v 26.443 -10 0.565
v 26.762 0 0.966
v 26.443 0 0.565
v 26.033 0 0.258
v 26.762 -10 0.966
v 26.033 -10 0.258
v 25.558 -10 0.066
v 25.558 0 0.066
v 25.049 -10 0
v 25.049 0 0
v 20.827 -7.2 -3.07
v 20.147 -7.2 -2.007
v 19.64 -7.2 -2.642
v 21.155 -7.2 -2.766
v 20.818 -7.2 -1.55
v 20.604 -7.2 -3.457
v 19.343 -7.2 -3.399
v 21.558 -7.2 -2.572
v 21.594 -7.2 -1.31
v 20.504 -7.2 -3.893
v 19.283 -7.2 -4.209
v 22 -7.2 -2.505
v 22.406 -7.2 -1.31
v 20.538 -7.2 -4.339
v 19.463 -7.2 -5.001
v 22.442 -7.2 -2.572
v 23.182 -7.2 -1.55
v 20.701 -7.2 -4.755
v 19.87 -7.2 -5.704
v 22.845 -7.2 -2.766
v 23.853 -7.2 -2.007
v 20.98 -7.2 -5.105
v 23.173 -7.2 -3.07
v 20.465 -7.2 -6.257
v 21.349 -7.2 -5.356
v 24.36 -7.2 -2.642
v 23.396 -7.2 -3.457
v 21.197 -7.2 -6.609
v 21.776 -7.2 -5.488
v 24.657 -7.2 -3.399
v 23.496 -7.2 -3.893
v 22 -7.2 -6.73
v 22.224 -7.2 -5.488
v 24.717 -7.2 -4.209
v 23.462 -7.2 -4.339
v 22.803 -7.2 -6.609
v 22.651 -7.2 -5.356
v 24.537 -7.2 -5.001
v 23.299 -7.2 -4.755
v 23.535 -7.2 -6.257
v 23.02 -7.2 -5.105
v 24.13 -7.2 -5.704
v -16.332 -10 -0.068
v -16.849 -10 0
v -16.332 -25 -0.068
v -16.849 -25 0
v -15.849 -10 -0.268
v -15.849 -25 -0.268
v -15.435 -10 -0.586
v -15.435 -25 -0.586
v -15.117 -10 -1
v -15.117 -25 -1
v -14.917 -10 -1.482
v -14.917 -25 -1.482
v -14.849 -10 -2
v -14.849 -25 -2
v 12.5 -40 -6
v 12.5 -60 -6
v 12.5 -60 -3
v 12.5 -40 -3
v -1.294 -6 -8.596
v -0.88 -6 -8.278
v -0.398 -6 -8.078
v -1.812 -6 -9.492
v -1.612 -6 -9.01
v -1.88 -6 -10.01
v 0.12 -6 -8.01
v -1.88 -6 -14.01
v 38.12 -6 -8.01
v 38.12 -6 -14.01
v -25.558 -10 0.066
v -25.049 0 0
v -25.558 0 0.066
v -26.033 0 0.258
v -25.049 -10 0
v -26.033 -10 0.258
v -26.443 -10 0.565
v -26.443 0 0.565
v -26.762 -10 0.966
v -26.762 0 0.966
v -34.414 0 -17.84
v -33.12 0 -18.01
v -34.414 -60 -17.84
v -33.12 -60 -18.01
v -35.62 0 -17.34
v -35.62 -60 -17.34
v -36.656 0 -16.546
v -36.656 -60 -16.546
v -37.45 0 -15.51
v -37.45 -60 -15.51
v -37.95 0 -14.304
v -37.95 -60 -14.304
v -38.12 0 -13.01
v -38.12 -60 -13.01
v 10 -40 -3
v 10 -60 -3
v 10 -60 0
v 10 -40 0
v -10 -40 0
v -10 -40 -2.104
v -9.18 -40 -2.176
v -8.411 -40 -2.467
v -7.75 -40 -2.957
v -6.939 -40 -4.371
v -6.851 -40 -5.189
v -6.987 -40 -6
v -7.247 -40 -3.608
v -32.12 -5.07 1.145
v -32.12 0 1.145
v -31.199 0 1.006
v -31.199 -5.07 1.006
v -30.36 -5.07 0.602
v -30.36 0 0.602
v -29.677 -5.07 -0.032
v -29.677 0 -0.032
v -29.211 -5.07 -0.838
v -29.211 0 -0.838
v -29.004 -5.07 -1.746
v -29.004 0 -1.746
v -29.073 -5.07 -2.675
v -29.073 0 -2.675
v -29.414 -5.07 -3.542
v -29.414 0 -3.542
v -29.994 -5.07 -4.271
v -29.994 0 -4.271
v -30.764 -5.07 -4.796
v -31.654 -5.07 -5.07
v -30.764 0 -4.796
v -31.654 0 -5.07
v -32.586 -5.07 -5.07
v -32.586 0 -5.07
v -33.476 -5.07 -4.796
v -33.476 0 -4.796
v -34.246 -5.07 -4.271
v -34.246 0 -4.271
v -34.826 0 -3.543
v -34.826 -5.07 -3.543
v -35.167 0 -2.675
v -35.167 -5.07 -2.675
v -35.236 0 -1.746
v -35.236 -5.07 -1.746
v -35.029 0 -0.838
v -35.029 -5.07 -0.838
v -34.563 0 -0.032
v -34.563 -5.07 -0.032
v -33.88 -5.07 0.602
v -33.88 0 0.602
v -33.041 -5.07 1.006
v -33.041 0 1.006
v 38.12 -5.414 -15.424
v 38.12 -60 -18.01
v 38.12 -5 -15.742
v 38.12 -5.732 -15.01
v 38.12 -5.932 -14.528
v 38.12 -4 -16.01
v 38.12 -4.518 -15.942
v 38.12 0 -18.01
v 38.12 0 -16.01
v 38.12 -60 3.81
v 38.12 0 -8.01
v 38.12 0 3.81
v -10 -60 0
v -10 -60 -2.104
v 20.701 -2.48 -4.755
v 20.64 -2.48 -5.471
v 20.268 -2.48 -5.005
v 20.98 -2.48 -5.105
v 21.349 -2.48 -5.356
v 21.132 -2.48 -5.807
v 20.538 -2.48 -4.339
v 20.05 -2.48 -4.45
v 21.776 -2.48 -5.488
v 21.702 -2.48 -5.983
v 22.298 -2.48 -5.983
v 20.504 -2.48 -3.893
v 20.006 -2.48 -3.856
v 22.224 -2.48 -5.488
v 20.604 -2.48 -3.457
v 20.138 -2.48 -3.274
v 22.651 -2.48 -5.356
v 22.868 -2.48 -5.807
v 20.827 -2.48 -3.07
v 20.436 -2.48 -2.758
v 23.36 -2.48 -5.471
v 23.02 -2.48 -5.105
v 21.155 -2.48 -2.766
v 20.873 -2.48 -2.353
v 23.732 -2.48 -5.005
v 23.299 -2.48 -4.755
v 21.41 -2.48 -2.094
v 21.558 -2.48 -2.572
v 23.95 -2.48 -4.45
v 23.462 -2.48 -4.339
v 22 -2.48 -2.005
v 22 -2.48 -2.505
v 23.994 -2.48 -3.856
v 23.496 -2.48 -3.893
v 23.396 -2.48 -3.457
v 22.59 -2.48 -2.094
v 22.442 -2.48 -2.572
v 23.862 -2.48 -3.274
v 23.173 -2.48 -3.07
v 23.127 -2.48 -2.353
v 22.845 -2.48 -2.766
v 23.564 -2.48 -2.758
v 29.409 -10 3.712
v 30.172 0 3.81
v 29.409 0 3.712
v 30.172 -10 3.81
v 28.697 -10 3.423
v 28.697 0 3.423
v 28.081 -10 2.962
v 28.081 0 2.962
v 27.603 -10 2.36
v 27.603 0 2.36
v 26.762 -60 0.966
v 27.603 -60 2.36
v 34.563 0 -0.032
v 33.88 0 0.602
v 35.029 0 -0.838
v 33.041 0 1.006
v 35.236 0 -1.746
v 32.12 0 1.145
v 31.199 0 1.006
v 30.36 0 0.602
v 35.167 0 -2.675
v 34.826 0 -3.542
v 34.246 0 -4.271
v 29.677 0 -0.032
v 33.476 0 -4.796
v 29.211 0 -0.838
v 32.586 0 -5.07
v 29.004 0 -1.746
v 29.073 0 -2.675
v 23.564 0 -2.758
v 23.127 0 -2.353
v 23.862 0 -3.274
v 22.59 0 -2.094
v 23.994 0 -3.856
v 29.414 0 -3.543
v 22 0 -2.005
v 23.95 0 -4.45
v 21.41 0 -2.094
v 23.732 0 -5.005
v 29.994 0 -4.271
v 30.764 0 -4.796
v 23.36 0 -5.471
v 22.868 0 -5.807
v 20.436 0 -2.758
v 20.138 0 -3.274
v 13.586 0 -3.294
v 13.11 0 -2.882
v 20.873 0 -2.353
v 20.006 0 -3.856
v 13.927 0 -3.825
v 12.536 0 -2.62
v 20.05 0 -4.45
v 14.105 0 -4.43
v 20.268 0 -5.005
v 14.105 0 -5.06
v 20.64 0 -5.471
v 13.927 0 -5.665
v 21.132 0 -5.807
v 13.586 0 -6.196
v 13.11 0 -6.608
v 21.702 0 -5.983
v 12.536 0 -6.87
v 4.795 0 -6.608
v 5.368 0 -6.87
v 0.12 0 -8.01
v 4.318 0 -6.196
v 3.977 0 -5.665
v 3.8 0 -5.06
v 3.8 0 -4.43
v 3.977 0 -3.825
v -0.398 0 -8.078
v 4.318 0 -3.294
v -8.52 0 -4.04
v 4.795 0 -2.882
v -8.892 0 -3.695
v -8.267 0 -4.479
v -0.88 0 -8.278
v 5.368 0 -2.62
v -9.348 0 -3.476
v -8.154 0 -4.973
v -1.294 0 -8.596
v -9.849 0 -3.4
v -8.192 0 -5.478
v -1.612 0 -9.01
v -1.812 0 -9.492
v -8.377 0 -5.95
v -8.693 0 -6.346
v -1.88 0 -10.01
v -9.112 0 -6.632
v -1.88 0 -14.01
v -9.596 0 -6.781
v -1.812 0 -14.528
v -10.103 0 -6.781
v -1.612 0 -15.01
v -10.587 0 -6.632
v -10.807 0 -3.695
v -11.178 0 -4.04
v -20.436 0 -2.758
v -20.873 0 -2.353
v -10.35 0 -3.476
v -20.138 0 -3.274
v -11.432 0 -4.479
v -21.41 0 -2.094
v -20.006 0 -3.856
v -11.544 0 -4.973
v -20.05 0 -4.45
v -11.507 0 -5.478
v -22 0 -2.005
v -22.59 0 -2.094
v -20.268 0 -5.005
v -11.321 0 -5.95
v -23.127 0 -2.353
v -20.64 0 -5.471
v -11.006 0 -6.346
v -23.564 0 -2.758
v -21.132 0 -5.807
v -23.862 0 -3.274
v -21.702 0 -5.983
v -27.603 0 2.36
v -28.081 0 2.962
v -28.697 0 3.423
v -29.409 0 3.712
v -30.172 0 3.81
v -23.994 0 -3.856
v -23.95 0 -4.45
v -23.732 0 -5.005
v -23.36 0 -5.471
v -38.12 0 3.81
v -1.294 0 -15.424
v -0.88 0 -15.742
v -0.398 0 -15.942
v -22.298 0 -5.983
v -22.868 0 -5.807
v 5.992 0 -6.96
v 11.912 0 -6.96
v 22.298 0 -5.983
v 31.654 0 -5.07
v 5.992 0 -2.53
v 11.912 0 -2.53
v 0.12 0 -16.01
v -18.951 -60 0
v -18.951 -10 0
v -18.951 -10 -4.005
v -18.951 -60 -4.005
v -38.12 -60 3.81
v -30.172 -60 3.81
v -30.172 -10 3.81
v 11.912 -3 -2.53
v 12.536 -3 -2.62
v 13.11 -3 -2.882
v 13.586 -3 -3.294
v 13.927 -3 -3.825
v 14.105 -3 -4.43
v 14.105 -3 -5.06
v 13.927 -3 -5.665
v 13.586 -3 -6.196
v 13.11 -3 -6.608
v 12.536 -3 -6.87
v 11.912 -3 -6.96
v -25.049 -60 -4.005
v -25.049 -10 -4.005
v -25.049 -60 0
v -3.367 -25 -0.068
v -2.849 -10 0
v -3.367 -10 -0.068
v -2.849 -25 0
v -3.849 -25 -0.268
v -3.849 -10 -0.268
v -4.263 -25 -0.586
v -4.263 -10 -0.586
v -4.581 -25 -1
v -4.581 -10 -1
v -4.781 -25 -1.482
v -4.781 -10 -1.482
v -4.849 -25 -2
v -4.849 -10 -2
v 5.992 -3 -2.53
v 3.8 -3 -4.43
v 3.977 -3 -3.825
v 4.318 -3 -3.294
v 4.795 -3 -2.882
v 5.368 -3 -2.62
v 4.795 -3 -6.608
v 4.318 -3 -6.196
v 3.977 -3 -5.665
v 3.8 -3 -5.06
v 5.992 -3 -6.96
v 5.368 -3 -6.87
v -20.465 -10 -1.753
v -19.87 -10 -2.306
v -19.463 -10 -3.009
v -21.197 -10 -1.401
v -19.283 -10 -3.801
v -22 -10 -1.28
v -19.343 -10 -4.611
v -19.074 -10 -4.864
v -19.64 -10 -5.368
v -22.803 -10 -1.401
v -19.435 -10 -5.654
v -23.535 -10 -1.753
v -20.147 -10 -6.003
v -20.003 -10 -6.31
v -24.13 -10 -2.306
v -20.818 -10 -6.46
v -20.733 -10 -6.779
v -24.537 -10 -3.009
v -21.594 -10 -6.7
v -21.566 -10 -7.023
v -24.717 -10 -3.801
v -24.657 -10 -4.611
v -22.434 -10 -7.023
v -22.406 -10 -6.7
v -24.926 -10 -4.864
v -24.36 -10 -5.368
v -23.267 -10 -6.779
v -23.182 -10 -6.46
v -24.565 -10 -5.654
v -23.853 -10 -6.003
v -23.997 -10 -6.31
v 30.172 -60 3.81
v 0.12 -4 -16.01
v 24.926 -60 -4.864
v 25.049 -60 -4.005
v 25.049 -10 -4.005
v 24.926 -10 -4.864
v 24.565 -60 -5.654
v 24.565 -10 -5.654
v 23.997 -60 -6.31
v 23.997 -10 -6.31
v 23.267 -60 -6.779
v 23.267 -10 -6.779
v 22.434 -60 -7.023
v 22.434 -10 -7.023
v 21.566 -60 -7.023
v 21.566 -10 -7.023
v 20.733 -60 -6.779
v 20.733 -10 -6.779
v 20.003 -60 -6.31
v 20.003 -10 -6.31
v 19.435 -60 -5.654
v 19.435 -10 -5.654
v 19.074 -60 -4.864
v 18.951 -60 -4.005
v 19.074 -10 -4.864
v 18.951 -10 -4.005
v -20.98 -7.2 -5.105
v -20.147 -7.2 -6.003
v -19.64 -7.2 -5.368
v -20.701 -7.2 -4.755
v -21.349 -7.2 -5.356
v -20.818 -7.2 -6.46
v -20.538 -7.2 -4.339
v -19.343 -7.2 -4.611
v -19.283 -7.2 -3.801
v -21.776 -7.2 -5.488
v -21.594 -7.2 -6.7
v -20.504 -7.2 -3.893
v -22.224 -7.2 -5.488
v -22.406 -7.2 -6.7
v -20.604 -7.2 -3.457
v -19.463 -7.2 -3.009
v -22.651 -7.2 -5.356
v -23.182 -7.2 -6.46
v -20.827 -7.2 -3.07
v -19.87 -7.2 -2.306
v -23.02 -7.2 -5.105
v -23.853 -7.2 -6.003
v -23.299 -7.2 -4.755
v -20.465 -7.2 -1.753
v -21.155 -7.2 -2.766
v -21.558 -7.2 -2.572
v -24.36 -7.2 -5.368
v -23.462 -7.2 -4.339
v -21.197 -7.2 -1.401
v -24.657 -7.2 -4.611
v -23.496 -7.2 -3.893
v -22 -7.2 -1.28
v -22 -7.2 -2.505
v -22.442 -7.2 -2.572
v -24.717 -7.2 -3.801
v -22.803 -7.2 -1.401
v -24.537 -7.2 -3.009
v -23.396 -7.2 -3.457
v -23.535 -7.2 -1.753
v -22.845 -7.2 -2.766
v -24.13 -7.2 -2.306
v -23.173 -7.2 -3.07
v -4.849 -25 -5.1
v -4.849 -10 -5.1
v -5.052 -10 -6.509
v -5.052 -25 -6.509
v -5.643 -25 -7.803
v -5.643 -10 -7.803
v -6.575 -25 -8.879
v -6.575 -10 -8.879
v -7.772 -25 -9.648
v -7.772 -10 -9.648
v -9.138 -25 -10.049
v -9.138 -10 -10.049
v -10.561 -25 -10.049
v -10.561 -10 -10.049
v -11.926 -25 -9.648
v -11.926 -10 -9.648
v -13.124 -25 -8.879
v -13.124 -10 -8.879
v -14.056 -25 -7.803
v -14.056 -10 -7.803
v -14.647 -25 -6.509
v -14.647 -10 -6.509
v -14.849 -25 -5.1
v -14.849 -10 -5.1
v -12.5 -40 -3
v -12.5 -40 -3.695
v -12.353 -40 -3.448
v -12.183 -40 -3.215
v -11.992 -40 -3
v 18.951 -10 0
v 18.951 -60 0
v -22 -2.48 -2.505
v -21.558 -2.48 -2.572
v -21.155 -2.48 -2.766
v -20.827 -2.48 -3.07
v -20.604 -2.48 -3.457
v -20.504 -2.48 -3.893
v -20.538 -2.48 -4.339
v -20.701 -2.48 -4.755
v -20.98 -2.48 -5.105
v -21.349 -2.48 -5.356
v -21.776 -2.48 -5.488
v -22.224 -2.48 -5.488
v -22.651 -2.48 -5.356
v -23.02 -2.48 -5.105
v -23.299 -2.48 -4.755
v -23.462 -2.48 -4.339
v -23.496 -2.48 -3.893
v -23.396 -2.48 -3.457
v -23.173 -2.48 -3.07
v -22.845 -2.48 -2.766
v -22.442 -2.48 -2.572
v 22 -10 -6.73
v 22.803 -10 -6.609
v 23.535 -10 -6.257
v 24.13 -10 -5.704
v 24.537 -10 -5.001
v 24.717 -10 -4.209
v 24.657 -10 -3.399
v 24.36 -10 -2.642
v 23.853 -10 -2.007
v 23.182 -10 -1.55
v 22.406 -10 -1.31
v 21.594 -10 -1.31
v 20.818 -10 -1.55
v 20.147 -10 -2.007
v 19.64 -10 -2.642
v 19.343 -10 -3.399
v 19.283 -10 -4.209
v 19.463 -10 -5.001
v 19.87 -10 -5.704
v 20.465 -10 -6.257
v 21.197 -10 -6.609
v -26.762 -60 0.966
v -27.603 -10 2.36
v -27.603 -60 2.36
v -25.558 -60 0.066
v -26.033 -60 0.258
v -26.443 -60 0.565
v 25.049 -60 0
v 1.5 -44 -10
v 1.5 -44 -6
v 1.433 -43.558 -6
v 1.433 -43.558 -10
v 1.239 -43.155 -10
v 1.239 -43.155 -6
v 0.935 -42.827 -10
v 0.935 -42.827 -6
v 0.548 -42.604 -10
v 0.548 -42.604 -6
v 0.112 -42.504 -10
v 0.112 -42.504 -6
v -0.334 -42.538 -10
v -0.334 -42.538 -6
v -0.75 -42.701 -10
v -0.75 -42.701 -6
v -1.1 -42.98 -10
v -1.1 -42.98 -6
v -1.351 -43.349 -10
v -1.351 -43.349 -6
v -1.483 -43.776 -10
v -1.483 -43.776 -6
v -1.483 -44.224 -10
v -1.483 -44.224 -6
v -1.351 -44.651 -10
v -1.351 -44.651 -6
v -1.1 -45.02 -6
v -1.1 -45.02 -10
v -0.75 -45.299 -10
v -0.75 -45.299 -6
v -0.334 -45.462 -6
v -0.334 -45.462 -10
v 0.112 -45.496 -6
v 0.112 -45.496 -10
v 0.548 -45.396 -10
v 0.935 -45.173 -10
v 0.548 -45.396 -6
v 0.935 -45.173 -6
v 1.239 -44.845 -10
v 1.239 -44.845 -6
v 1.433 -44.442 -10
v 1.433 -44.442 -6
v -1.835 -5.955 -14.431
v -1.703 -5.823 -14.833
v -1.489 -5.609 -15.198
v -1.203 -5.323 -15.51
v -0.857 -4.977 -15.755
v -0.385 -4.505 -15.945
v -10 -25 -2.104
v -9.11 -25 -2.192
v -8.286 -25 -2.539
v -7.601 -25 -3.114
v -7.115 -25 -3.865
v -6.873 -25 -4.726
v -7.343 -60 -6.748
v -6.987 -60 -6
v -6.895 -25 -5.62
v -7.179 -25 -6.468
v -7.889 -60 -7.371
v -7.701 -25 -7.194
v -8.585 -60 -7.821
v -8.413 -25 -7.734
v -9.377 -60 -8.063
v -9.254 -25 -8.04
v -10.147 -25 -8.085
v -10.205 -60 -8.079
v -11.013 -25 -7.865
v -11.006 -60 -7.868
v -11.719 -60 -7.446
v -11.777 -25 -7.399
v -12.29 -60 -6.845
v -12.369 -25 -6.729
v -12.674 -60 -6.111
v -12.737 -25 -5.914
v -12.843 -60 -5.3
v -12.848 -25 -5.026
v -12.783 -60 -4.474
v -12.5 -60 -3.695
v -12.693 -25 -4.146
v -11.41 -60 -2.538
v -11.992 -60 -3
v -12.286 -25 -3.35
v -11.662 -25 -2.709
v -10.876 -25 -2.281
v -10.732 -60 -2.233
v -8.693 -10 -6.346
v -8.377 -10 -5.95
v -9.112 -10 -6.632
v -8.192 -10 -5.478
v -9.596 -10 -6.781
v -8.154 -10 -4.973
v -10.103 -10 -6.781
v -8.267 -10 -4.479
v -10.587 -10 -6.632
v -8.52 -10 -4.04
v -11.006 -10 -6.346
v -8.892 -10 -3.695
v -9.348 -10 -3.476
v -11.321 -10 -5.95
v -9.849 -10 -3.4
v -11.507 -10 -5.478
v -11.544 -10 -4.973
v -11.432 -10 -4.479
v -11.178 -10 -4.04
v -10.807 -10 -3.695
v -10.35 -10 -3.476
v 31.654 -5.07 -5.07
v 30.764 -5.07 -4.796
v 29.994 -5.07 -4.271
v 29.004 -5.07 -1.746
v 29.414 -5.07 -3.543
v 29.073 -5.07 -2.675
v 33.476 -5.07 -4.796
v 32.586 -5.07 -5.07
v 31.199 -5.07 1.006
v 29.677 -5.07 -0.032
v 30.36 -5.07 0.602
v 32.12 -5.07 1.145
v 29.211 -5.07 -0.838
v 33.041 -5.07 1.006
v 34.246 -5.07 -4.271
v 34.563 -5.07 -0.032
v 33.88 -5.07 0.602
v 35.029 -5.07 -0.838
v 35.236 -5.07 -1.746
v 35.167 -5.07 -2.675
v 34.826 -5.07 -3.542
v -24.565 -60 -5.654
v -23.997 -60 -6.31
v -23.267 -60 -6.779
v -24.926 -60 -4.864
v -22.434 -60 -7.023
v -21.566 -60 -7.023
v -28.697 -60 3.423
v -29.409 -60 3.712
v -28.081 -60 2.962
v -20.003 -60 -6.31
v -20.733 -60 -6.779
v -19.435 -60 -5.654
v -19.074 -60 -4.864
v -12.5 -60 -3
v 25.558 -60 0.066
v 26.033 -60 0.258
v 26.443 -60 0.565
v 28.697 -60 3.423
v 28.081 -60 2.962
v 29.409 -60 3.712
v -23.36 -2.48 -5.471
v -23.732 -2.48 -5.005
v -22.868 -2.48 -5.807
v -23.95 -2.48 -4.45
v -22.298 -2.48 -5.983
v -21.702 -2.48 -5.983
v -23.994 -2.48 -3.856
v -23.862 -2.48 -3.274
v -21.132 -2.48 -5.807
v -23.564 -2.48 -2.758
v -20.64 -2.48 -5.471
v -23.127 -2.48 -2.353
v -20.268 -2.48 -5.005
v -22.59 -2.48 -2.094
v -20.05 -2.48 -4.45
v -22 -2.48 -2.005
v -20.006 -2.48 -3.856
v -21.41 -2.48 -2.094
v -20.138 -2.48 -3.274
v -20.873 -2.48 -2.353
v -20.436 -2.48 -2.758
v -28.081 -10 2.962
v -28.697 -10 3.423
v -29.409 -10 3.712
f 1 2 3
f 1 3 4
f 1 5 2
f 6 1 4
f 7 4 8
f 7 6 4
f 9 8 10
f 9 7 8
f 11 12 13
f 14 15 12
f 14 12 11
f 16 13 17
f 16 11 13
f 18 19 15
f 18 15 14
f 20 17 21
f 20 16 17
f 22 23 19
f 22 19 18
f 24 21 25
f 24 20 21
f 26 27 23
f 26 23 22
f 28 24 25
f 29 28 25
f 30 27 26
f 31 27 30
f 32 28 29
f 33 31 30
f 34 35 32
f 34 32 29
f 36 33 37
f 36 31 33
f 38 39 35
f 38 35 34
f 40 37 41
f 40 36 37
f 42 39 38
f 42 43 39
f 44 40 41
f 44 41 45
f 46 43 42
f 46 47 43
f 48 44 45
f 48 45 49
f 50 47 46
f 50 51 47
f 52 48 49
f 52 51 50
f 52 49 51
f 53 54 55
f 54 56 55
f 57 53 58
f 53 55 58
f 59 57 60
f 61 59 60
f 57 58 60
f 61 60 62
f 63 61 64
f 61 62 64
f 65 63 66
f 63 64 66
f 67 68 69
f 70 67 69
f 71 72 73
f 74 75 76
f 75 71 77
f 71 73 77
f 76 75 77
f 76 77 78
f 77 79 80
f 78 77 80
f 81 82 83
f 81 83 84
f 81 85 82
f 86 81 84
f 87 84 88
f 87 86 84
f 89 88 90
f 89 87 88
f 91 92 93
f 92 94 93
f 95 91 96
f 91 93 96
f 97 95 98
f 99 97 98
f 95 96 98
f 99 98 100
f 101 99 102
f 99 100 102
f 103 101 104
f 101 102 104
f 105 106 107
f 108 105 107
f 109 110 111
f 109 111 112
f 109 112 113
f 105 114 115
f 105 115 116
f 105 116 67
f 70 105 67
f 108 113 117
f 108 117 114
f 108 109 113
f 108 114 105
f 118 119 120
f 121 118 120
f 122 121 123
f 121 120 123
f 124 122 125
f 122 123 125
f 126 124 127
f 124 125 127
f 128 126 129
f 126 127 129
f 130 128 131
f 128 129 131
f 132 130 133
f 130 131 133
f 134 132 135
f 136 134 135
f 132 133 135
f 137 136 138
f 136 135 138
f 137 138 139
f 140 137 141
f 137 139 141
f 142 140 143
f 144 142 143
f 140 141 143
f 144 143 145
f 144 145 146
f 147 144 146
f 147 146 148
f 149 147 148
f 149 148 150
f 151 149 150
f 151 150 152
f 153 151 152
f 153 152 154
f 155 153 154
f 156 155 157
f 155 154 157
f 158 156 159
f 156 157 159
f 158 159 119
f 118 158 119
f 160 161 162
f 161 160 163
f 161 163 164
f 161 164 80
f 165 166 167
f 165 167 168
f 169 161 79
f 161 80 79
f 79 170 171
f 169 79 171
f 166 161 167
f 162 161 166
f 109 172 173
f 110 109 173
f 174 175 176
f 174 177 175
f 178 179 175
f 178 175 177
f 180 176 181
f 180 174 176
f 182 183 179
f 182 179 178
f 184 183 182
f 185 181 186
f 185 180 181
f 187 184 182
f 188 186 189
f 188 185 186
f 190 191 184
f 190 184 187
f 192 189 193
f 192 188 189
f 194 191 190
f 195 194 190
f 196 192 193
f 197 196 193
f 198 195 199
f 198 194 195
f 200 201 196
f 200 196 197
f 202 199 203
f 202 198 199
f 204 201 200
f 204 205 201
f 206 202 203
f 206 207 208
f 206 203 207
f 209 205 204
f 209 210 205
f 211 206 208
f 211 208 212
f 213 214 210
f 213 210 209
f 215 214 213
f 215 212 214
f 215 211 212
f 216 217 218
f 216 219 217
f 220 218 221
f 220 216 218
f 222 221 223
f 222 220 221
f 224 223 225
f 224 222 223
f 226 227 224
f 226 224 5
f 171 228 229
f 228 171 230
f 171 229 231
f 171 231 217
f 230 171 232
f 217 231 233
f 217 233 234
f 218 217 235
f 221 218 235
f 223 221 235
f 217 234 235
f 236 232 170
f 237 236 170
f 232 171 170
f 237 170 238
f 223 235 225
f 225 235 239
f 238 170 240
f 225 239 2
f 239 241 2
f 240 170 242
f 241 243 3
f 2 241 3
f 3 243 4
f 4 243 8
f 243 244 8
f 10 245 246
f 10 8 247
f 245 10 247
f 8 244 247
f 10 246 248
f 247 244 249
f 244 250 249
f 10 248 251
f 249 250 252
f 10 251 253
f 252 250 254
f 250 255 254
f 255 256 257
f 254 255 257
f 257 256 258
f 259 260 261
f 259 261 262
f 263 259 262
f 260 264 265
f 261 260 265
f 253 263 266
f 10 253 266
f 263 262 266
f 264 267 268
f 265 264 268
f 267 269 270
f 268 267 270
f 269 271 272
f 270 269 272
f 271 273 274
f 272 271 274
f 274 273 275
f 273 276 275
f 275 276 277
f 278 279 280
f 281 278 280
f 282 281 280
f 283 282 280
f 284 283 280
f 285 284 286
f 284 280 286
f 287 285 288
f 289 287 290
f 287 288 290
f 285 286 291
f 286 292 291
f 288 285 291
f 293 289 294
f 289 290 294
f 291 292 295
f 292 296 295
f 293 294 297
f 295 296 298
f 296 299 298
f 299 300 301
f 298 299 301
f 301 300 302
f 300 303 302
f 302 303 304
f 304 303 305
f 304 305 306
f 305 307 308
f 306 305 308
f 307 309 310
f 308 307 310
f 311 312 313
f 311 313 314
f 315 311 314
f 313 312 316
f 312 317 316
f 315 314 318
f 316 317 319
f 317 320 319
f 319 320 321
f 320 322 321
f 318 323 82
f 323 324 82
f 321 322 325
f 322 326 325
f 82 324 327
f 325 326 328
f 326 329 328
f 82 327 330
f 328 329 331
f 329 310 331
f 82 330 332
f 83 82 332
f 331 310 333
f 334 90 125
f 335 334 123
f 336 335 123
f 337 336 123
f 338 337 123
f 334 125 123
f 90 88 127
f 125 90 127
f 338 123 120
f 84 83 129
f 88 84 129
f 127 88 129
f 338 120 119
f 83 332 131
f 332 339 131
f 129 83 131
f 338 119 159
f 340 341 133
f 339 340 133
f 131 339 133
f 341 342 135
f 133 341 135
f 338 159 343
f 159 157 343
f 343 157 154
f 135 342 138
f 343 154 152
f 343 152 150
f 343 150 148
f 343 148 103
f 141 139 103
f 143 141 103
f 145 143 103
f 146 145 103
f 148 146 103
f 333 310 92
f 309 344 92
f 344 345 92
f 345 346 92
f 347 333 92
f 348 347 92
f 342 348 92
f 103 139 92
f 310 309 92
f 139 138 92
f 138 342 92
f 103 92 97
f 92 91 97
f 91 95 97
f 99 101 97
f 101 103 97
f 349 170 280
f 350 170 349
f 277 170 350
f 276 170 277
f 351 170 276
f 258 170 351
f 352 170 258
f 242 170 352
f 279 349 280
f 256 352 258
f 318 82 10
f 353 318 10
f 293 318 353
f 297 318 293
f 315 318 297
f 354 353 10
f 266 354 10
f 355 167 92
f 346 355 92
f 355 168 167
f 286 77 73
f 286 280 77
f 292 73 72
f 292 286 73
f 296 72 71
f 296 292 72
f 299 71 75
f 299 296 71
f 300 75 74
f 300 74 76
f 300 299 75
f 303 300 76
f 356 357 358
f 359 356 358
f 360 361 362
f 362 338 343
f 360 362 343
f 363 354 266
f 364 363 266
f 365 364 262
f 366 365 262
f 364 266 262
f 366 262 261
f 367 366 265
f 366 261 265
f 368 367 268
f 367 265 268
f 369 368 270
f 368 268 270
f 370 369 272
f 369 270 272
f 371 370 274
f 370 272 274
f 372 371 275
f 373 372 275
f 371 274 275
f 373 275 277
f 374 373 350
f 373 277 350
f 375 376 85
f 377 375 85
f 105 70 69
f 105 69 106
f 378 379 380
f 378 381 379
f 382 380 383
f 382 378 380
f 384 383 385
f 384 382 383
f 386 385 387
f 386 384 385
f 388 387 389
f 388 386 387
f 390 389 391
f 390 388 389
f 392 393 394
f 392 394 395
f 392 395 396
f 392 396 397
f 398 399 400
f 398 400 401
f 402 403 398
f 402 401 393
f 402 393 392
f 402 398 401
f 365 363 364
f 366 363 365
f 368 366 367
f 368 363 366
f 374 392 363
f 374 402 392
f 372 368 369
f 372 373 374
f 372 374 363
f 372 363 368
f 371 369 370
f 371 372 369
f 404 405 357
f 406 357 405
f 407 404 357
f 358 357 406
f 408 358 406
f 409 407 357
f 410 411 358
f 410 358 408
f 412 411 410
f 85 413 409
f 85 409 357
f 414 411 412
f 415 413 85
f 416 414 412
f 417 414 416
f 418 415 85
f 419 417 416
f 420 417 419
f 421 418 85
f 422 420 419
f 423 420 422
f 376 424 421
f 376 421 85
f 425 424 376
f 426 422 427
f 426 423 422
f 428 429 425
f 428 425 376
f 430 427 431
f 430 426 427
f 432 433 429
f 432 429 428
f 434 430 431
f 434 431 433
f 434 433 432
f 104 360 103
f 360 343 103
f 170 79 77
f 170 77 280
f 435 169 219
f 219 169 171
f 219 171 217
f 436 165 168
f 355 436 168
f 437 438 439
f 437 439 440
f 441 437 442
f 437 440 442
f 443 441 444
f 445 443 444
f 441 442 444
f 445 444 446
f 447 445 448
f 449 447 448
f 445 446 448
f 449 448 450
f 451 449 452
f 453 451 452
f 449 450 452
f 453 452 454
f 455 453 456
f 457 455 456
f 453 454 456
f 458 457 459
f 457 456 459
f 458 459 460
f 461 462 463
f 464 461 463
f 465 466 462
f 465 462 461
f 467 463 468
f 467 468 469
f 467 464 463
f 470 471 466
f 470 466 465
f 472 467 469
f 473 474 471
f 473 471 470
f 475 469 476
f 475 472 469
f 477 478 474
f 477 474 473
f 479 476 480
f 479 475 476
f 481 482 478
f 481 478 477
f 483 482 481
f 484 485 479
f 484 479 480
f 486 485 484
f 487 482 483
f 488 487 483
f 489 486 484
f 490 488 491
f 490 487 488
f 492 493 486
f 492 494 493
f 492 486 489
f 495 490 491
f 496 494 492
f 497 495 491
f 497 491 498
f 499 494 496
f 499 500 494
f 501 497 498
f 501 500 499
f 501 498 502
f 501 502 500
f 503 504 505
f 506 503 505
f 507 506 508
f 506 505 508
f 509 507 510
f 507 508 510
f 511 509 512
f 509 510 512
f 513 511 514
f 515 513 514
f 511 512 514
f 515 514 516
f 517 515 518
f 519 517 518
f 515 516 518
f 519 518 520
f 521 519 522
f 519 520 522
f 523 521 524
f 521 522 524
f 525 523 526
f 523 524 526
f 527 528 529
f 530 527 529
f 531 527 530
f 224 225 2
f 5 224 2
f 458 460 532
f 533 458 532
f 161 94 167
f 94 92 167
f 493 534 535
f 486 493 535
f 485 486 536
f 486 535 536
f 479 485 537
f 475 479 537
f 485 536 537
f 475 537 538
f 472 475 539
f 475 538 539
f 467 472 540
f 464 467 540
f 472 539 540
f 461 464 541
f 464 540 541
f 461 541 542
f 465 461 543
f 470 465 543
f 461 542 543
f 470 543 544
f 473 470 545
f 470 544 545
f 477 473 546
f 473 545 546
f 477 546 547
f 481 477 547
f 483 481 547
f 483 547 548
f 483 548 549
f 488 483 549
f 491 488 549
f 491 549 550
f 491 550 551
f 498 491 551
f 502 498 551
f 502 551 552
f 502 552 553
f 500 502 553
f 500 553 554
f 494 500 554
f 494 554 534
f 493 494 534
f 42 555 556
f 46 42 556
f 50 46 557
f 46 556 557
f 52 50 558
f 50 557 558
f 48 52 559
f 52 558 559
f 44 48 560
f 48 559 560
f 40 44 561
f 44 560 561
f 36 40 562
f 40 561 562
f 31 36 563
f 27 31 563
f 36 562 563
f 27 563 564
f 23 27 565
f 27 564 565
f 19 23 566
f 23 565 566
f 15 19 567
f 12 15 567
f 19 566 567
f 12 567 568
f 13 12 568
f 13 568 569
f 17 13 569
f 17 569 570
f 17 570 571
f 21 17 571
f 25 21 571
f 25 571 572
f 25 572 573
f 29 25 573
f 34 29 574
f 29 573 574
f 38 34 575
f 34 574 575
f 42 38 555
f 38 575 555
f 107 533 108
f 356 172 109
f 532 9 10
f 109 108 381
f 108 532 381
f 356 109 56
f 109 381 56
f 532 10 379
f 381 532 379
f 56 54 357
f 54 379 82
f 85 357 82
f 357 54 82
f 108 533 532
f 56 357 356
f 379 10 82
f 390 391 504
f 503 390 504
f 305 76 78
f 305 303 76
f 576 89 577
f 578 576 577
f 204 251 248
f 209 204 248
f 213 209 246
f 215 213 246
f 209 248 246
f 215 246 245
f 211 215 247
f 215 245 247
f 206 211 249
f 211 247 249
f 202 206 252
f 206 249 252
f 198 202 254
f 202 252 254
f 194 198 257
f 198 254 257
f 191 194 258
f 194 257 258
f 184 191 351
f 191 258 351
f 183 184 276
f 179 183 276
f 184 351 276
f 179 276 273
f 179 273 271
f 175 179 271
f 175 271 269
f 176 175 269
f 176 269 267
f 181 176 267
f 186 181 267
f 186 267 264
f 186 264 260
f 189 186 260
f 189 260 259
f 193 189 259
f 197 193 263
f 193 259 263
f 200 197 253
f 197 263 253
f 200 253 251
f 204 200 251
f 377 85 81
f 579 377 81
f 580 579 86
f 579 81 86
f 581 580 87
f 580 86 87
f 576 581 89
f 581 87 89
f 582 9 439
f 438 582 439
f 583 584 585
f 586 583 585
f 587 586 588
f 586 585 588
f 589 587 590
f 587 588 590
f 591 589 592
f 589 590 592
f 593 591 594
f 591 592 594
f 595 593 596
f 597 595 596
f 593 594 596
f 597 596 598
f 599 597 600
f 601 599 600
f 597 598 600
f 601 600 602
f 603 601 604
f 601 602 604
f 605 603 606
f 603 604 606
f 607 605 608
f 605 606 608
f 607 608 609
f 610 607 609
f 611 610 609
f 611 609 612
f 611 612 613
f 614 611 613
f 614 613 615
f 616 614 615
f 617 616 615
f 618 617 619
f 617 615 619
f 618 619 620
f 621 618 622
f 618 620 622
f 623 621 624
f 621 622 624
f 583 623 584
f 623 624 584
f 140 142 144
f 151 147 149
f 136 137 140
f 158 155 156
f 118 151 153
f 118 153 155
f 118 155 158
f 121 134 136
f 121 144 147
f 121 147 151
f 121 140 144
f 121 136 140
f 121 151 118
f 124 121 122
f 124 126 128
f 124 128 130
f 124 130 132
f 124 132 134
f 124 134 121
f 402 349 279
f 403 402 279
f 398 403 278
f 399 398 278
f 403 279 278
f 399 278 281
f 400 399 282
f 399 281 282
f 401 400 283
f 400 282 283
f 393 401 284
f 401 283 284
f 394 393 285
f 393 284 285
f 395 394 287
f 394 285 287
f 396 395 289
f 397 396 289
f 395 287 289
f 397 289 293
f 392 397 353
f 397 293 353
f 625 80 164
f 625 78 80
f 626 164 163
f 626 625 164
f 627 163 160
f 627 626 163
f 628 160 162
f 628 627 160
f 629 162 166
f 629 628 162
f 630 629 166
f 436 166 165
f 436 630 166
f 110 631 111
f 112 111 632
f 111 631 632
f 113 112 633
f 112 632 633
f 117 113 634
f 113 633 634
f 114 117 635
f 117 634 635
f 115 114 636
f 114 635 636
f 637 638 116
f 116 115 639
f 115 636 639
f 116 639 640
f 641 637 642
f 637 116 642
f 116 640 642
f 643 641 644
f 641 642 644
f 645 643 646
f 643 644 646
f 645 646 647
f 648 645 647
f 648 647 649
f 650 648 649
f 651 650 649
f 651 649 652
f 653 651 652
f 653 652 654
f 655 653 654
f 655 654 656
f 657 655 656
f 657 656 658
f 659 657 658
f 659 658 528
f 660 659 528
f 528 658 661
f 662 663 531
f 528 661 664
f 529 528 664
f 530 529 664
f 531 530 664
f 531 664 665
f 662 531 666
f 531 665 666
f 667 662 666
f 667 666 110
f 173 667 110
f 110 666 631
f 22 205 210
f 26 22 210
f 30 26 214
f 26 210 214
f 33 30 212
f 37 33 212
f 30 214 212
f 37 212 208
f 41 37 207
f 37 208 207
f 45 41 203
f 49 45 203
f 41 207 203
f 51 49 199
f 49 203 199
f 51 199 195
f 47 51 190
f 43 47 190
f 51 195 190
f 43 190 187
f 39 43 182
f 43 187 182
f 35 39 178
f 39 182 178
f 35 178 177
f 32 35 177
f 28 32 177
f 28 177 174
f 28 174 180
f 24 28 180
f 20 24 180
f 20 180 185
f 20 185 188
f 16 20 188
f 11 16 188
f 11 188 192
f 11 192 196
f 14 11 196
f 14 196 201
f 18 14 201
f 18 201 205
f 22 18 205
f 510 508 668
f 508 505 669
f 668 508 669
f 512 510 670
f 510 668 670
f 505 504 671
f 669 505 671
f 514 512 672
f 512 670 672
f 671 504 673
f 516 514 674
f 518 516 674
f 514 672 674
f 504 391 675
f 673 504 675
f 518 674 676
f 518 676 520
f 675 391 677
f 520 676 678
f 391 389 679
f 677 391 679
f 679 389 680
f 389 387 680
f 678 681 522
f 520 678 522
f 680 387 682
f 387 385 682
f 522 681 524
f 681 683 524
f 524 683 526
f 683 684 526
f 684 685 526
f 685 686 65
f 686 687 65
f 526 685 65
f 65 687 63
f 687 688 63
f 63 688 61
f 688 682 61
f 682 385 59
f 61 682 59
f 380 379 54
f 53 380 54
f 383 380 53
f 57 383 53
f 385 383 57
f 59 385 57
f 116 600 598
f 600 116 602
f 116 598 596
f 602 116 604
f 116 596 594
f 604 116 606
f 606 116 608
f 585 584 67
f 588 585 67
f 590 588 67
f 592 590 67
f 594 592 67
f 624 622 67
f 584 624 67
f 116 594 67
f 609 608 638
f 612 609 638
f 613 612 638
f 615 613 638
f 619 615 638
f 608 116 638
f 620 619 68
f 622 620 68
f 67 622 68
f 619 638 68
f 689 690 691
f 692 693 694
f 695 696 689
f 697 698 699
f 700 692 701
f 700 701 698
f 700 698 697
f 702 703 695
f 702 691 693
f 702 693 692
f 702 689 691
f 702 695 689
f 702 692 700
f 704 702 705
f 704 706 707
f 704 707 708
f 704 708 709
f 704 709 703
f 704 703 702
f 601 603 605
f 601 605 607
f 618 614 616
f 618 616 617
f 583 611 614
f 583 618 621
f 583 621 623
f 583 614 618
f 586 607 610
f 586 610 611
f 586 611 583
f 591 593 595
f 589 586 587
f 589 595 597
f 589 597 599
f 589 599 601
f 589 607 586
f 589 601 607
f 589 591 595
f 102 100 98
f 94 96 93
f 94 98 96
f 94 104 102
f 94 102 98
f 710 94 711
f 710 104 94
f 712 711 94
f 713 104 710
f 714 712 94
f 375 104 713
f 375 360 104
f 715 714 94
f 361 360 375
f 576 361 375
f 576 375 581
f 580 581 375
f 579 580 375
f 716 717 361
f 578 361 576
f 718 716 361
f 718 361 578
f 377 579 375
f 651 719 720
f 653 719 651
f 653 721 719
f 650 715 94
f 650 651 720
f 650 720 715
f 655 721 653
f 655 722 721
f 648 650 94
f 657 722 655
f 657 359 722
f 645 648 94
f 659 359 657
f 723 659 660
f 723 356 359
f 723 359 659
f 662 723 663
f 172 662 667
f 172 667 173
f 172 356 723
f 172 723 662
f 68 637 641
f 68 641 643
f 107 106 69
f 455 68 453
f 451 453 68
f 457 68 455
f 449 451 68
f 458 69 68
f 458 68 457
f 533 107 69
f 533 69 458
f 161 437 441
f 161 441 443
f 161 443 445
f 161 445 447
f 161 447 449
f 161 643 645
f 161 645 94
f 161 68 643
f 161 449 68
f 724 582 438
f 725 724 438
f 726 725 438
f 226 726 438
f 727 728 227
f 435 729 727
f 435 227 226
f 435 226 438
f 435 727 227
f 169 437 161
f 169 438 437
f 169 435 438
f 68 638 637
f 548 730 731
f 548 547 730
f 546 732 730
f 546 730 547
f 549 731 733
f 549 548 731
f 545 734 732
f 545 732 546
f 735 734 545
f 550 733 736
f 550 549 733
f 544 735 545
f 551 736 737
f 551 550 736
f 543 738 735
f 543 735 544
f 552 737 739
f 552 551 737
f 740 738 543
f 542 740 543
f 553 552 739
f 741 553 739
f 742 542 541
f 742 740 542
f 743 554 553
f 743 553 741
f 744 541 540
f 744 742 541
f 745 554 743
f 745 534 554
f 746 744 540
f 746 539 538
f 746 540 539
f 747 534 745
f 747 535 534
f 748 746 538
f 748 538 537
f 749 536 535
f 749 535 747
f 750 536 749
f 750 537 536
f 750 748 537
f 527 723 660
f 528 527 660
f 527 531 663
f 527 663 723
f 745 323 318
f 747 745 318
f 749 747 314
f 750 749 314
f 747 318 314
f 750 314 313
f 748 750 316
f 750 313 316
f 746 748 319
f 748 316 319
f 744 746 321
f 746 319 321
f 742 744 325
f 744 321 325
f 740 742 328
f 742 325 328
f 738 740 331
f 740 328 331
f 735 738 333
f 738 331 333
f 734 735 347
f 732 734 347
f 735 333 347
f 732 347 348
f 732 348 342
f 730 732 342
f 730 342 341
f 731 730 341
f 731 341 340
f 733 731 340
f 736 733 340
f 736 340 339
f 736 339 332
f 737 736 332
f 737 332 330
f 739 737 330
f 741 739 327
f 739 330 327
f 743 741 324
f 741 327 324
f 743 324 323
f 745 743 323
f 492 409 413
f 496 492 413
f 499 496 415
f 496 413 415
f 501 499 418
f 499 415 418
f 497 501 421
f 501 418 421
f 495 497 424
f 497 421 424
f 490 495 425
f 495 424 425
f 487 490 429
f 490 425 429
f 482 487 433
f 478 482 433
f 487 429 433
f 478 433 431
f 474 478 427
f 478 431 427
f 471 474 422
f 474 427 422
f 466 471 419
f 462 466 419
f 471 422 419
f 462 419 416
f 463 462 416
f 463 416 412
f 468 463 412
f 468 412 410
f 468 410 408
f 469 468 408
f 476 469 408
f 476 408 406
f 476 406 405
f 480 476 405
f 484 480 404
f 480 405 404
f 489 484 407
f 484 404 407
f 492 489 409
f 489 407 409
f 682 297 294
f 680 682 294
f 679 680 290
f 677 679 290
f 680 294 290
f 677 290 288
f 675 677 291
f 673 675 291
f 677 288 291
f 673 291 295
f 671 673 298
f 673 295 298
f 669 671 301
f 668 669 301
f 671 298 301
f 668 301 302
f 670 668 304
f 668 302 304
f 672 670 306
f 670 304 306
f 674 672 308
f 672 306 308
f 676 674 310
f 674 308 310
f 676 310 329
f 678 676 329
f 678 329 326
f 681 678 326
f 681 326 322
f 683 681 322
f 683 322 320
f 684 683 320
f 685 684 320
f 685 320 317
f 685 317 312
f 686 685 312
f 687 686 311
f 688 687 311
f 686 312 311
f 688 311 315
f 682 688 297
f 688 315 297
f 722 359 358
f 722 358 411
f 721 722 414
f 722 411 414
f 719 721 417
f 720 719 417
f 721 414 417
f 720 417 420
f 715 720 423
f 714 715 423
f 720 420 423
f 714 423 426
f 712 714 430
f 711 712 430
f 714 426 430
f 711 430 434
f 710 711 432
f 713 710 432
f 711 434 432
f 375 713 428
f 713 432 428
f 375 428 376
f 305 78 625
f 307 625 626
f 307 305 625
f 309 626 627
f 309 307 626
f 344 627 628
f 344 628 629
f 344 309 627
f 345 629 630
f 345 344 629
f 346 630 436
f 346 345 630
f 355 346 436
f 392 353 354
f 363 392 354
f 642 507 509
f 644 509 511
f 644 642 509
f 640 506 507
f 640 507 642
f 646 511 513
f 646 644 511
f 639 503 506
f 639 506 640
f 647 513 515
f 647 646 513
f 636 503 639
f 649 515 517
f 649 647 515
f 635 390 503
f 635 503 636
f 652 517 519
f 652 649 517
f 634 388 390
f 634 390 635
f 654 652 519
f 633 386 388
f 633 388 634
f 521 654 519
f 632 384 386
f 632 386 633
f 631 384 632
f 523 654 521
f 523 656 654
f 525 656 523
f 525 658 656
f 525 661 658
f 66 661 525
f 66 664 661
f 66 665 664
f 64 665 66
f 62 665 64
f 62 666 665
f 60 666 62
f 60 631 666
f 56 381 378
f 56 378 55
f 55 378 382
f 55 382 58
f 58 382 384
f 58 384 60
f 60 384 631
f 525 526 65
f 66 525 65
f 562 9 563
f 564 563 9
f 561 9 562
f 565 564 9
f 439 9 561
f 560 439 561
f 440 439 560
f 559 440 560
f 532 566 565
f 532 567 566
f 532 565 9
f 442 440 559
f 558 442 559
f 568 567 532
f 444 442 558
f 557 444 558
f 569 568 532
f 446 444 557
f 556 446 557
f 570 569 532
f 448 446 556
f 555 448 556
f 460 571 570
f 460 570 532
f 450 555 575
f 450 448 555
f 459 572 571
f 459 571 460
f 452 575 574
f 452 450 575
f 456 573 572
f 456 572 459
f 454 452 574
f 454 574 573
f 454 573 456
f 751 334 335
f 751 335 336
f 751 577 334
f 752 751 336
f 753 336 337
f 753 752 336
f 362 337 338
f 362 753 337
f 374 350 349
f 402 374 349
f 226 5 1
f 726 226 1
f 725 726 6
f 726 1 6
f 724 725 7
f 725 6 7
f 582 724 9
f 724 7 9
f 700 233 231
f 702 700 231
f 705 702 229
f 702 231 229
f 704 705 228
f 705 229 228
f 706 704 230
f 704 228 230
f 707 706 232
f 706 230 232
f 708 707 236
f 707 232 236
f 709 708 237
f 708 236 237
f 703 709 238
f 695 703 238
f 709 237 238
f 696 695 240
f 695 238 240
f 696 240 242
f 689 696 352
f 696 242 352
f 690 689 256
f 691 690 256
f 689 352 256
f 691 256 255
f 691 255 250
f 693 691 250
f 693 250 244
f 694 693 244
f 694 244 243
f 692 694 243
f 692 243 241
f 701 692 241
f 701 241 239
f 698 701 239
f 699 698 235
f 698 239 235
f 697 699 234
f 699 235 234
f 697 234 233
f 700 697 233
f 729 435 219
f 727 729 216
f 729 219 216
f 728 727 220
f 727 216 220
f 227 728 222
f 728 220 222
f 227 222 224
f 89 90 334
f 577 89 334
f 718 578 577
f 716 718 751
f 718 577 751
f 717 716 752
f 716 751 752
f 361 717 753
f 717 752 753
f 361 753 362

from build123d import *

# Parameters (mm, degrees)
SKETCH1_R           = 2
SKETCH1_R_2         = 3.125
SKETCH1_R_3         = 1.7
BOSS_EXTRUDE1_DEPTH = 10
FILLET2_R           = 3
FILLET1_R           = 2
SKETCH1_4_R         = 3.125
CUT_EXTRUDE3_DEPTH  = 5.07
SKETCH1_7_R         = 1.7
CUT_EXTRUDE6_DEPTH  = 10
CUT_EXTRUDE5_DEPTH  = 3
SKETCH1_5_R         = 2
CUT_EXTRUDE4_DEPTH  = 2.48
SKETCH4_R           = 1.5
CUT_EXTRUDE7_DEPTH  = 10
SKETCH5_R           = 2.725
CUT_EXTRUDE8_DEPTH  = 2.8
BOSS_EXTRUDE2_DEPTH = 10
BOSS_EXTRUDE3_DEPTH = 50
FILLET13_R          = 5
CUT_EXTRUDE14_DEPTH = 15
SKETCH10_W          = 8
SKETCH10_H          = 6
CUT_EXTRUDE12_DEPTH = 40
FILLET12_R          = 2
FILLET14_R          = 2
CUT_EXTRUDE17_DEPTH = 20
SKETCH19_R          = 1.5
CUT_EXTRUDE18_DEPTH = 4
CUT_EXTRUDE19_START = 35
SKETCH20_R          = 3
CUT_EXTRUDE19_DEPTH = 109.331401869


with BuildPart() as part:
    # Sketch1 → Boss-Extrude1 (new body)
    with BuildSketch(Plane(origin=(0, 0, 0), x_dir=(1, 0, 0), z_dir=(0, 1, 0))):
        with BuildLine():
            ThreePointArc((-11.409245094, 8.977987014), (-9.849239736, 9.28), (-8.289234378, 8.977987014))
            ThreePointArc((-8.289234378, 8.977987014), (-5.835653376, 8.254222737), (-3.289234378, 8.01))
            Line((-3.289234378, 8.01), (38.12, 8.01))
            Line((38.12, 8.01), (38.12, -3.81))
            Line((38.12, -3.81), (28.478275237, -3.81))
            Line((28.478275237, -3.81), (26.178275237, 0))
            Line((26.178275237, 0), (-26.178275237, 0))
            Line((-26.178275237, 0), (-28.478275237, -3.81))
            Line((-28.478275237, -3.81), (-38.12, -3.81))
            Line((-38.12, -3.81), (-38.12, 8.01))
            Line((-38.12, 8.01), (-16.409245094, 8.01))
            ThreePointArc((-16.409245094, 8.01), (-13.862826096, 8.254222737), (-11.409245094, 8.977987014))
        make_face()
        with Locations((22, 4.005)):
            Circle(SKETCH1_R, mode=Mode.SUBTRACT)
        with Locations((-22, 4.005)):
            Circle(SKETCH1_R, mode=Mode.SUBTRACT)
        with Locations((-32.12, 1.98)):
            Circle(SKETCH1_R_2, mode=Mode.SUBTRACT)
        with Locations((32.12, 1.98)):
            Circle(SKETCH1_R_2, mode=Mode.SUBTRACT)
        with Locations((-9.849239736, 5.1)):
            Circle(SKETCH1_R_3, mode=Mode.SUBTRACT)
        with BuildLine():
            ThreePointArc((11.912105026, 2.53), (14.127105026, 4.745), (11.912105026, 6.96))
            Line((11.912105026, 6.96), (5.992105026, 6.96))
            ThreePointArc((5.992105026, 6.96), (3.777105026, 4.745), (5.992105026, 2.53))
            Line((5.992105026, 2.53), (11.912105026, 2.53))
        make_face(mode=Mode.SUBTRACT)
        with Locations((-22, 4.005)):
            Circle(SKETCH1_R)
        with Locations((-9.849239736, 5.1)):
            Circle(SKETCH1_R_3)
        with Locations((-32.12, 1.98)):
            Circle(SKETCH1_R_2)
        with BuildLine():
            Line((5.992105026, 2.53), (11.912105026, 2.53))
            ThreePointArc((11.912105026, 2.53), (14.127105026, 4.745), (11.912105026, 6.96))
            Line((11.912105026, 6.96), (5.992105026, 6.96))
            ThreePointArc((5.992105026, 6.96), (3.777105026, 4.745), (5.992105026, 2.53))
        make_face()
        with Locations((22, 4.005)):
            Circle(SKETCH1_R)
        with Locations((32.12, 1.98)):
            Circle(SKETCH1_R_2)
    extrude(amount=-BOSS_EXTRUDE1_DEPTH)

    # Fillet2
    fillet2_edges = [part.edges().sort_by_distance(p)[0] for p in [
        (28.478275237, -5, 3.81),
        (-28.478275237, -5, 3.81),
    ]]
    fillet(fillet2_edges, radius=FILLET2_R)

    # Fillet1
    fillet1_edges = [part.edges().sort_by_distance(p)[0] for p in [
        (26.178275237, -5, 0),
        (-26.178275237, -5, 0),
    ]]
    fillet(fillet1_edges, radius=FILLET1_R)

    # Sketch1_4 → Cut-Extrude3 (cut)
    with BuildSketch(Plane(origin=(0, 0, 0), x_dir=(1, 0, 0), z_dir=(0, 1, 0))):
        with Locations(Location((32.12, 1.98, 0), (0, 0, 270))):
            Circle(SKETCH1_4_R)
        with Locations(Location((-32.12, 1.98, 0), (0, 0, 270))):
            Circle(SKETCH1_4_R)
    extrude(amount=-CUT_EXTRUDE3_DEPTH, mode=Mode.SUBTRACT)

    # Sketch1_7 → Cut-Extrude6 (cut)
    with BuildSketch(Plane(origin=(0, 0, 0), x_dir=(1, 0, 0), z_dir=(0, 1, 0))):
        with Locations(Location((-9.849239736, 5.1, 0), (0, 0, 270))):
            Circle(SKETCH1_7_R)
    extrude(amount=-CUT_EXTRUDE6_DEPTH, mode=Mode.SUBTRACT)

    # Sketch1_6 → Cut-Extrude5 (cut)
    with BuildSketch(Plane(origin=(0, 0, 0), x_dir=(1, 0, 0), z_dir=(0, 1, 0))):
        with BuildLine():
            Line((5.992105026, 2.53), (11.912105026, 2.53))
            ThreePointArc((11.912105026, 2.53), (14.127105026, 4.745), (11.912105026, 6.96))
            Line((11.912105026, 6.96), (5.992105026, 6.96))
            ThreePointArc((5.992105026, 6.96), (3.777105026, 4.745), (5.992105026, 2.53))
        make_face()
    extrude(amount=-CUT_EXTRUDE5_DEPTH, mode=Mode.SUBTRACT)

    # Sketch1_5 → Cut-Extrude4 (cut)
    with BuildSketch(Plane(origin=(0, 0, 0), x_dir=(1, 0, 0), z_dir=(0, 1, 0))):
        with Locations(Location((-22, 4.005, 0), (0, 0, 270))):
            Circle(SKETCH1_5_R)
        with Locations(Location((22, 4.005, 0), (0, 0, 270))):
            Circle(SKETCH1_5_R)
    extrude(amount=-CUT_EXTRUDE4_DEPTH, mode=Mode.SUBTRACT)

    # Sketch4 → Cut-Extrude7 (cut)
    with BuildSketch(Plane(origin=(0, 0, 0), x_dir=(1, 0, 0), z_dir=(0, 1, 0))):
        with Locations(Location((-22, 4.005, 0), (0, 0, 270))):
            Circle(SKETCH4_R)
        with Locations(Location((22, 4.005, 0), (0, 0, 270))):
            Circle(SKETCH4_R)
    extrude(amount=-CUT_EXTRUDE7_DEPTH, mode=Mode.SUBTRACT)

    # Sketch5 → Cut-Extrude8 (cut)
    with BuildSketch(Plane.XZ.offset(10)):
        with Locations(Location((22, -4.005, 0), (0, 0, 270))):
            Circle(SKETCH5_R)
        with Locations(Location((-22, -4.005, 0), (0, 0, 90))):
            Circle(SKETCH5_R)
    extrude(amount=-CUT_EXTRUDE8_DEPTH, mode=Mode.SUBTRACT)

    # Sketch6 → Boss-Extrude2 (add)
    with BuildSketch(Plane(origin=(0, 0, 0), x_dir=(1, 0, 0), z_dir=(0, 1, 0))):
        with BuildLine():
            Line((-38.12, 8.01), (-38.12, 18.01))
            Line((-38.12, 18.01), (38.12, 18.01))
            Line((38.12, 18.01), (38.12, 8.01))
            Line((38.12, 8.01), (-3.289234378, 8.01))
            ThreePointArc((-3.289234378, 8.01), (-5.835653376, 8.254222737), (-8.289234378, 8.977987014))
            ThreePointArc((-8.289234378, 8.977987014), (-9.849239736, 9.28), (-11.409245094, 8.977987014))
            ThreePointArc((-11.409245094, 8.977987014), (-13.862826096, 8.254222737), (-16.409245094, 8.01))
            Line((-16.409245094, 8.01), (-38.12, 8.01))
        make_face()
    extrude(amount=-BOSS_EXTRUDE2_DEPTH)

    # Sketch8 → Boss-Extrude3 (add)
    with BuildSketch(Plane.XZ.offset(10)):
        with BuildLine():
            Line((18.950546011, 0), (-18.950546011, 0))
            Line((-18.950546011, 0), (-18.950546011, -4.005))
            ThreePointArc((-18.950546011, -4.005), (-22, -7.054453989), (-25.049453989, -4.005))
            Line((-25.049453989, -4.005), (-25.049453989, 0))
            ThreePointArc((-25.049453989, 0), (-26.032503369, 0.25827272), (-26.761657912, 0.966386084))
            Line((-26.761657912, 0.966386084), (-27.603201224, 2.360420875))
            ThreePointArc((-27.603201224, 2.360420875), (-28.696933037, 3.422590919), (-30.171507108, 3.81))
            Line((-30.171507108, 3.81), (-38.12, 3.81))
            Line((-38.12, 3.81), (-38.12, -18.01))
            Line((-38.12, -18.01), (38.12, -18.01))
            Line((38.12, -18.01), (38.12, 3.81))
            Line((38.12, 3.81), (30.171507108, 3.81))
            ThreePointArc((30.171507108, 3.81), (28.696933037, 3.422590919), (27.603201224, 2.360420875))
            Line((27.603201224, 2.360420875), (26.761657912, 0.966386084))
            ThreePointArc((26.761657912, 0.966386084), (26.032503369, 0.25827272), (25.049453989, 0))
            Line((25.049453989, 0), (25.049453989, -4.005))
            ThreePointArc((25.049453989, -4.005), (22, -7.054453989), (18.950546011, -4.005))
            Line((18.950546011, -4.005), (18.950546011, 0))
        make_face()
    extrude(amount=BOSS_EXTRUDE3_DEPTH)

    # Fillet13
    fillet13_edges = [part.edges().sort_by_distance(p)[0] for p in [
        (-38.12, -30, -18.01),
    ]]
    fillet(fillet13_edges, radius=FILLET13_R)

    # Sketch8_3 → Cut-Extrude14 (cut)
    with BuildSketch(Plane.XZ.offset(10)):
        with BuildLine():
            Line((-4.849239736, 0), (-4.849239736, -5.1))
            ThreePointArc((-4.849239736, -5.1), (-9.849239736, -10.1), (-14.849239736, -5.1))
            Line((-14.849239736, -5.1), (-14.849239736, 0))
            Line((-14.849239736, 0), (-4.849239736, 0))
        make_face()
    extrude(amount=CUT_EXTRUDE14_DEPTH, mode=Mode.SUBTRACT)

    # Sketch10 → Cut-Extrude12 (cut)
    with BuildSketch(Plane(origin=(38.12, 0, 0), x_dir=(0, 0, -1), z_dir=(1, 0, 0))):
        with Locations((12.01, -3)):
            Rectangle(SKETCH10_W, SKETCH10_H)
    extrude(amount=-CUT_EXTRUDE12_DEPTH, mode=Mode.SUBTRACT)

    # Fillet12
    fillet12_edges = [part.edges().sort_by_distance(p)[0] for p in [
        (-4.849239736, -17.5, 0),
        (-14.849239736, -17.5, 0),
    ]]
    fillet(fillet12_edges, radius=FILLET12_R)

    # Fillet14
    fillet14_edges = [part.edges().sort_by_distance(p)[0] for p in [
        (-1.88, -3, -16.01),
        (18.12, -6, -16.01),
        (-1.88, -3, -8.01),
    ]]
    fillet(fillet14_edges, radius=FILLET14_R)

    # Sketch18 → Cut-Extrude17 (cut)
    with BuildSketch(Plane.XZ.offset(60)):
        Polygon((-10, 0), (-10, -3), (-12.5, -3), (-12.5, -6), (12.5, -6), (12.5, -3), (10, -3), (10, 0), align=None)
    extrude(amount=-CUT_EXTRUDE17_DEPTH, mode=Mode.SUBTRACT)

    # Sketch19 → Cut-Extrude18 (cut)
    with BuildSketch(Plane.XY.offset(-6)):
        with Locations((0, -44)):
            Circle(SKETCH19_R)
    extrude(amount=-CUT_EXTRUDE18_DEPTH, mode=Mode.SUBTRACT)

    # Sketch20 → Cut-Extrude19 (cut, through all)
    with BuildSketch(Plane(origin=(0, -60, 0), x_dir=(1, 0, 0), z_dir=(0, 1, 0)).offset(CUT_EXTRUDE19_START)):
        with Locations(Location((-9.849239736, 5.1, 0), (0, 0, 267.119477763))):
            Circle(SKETCH20_R)
    extrude(amount=-CUT_EXTRUDE19_DEPTH, mode=Mode.SUBTRACT)


solid = part.part
